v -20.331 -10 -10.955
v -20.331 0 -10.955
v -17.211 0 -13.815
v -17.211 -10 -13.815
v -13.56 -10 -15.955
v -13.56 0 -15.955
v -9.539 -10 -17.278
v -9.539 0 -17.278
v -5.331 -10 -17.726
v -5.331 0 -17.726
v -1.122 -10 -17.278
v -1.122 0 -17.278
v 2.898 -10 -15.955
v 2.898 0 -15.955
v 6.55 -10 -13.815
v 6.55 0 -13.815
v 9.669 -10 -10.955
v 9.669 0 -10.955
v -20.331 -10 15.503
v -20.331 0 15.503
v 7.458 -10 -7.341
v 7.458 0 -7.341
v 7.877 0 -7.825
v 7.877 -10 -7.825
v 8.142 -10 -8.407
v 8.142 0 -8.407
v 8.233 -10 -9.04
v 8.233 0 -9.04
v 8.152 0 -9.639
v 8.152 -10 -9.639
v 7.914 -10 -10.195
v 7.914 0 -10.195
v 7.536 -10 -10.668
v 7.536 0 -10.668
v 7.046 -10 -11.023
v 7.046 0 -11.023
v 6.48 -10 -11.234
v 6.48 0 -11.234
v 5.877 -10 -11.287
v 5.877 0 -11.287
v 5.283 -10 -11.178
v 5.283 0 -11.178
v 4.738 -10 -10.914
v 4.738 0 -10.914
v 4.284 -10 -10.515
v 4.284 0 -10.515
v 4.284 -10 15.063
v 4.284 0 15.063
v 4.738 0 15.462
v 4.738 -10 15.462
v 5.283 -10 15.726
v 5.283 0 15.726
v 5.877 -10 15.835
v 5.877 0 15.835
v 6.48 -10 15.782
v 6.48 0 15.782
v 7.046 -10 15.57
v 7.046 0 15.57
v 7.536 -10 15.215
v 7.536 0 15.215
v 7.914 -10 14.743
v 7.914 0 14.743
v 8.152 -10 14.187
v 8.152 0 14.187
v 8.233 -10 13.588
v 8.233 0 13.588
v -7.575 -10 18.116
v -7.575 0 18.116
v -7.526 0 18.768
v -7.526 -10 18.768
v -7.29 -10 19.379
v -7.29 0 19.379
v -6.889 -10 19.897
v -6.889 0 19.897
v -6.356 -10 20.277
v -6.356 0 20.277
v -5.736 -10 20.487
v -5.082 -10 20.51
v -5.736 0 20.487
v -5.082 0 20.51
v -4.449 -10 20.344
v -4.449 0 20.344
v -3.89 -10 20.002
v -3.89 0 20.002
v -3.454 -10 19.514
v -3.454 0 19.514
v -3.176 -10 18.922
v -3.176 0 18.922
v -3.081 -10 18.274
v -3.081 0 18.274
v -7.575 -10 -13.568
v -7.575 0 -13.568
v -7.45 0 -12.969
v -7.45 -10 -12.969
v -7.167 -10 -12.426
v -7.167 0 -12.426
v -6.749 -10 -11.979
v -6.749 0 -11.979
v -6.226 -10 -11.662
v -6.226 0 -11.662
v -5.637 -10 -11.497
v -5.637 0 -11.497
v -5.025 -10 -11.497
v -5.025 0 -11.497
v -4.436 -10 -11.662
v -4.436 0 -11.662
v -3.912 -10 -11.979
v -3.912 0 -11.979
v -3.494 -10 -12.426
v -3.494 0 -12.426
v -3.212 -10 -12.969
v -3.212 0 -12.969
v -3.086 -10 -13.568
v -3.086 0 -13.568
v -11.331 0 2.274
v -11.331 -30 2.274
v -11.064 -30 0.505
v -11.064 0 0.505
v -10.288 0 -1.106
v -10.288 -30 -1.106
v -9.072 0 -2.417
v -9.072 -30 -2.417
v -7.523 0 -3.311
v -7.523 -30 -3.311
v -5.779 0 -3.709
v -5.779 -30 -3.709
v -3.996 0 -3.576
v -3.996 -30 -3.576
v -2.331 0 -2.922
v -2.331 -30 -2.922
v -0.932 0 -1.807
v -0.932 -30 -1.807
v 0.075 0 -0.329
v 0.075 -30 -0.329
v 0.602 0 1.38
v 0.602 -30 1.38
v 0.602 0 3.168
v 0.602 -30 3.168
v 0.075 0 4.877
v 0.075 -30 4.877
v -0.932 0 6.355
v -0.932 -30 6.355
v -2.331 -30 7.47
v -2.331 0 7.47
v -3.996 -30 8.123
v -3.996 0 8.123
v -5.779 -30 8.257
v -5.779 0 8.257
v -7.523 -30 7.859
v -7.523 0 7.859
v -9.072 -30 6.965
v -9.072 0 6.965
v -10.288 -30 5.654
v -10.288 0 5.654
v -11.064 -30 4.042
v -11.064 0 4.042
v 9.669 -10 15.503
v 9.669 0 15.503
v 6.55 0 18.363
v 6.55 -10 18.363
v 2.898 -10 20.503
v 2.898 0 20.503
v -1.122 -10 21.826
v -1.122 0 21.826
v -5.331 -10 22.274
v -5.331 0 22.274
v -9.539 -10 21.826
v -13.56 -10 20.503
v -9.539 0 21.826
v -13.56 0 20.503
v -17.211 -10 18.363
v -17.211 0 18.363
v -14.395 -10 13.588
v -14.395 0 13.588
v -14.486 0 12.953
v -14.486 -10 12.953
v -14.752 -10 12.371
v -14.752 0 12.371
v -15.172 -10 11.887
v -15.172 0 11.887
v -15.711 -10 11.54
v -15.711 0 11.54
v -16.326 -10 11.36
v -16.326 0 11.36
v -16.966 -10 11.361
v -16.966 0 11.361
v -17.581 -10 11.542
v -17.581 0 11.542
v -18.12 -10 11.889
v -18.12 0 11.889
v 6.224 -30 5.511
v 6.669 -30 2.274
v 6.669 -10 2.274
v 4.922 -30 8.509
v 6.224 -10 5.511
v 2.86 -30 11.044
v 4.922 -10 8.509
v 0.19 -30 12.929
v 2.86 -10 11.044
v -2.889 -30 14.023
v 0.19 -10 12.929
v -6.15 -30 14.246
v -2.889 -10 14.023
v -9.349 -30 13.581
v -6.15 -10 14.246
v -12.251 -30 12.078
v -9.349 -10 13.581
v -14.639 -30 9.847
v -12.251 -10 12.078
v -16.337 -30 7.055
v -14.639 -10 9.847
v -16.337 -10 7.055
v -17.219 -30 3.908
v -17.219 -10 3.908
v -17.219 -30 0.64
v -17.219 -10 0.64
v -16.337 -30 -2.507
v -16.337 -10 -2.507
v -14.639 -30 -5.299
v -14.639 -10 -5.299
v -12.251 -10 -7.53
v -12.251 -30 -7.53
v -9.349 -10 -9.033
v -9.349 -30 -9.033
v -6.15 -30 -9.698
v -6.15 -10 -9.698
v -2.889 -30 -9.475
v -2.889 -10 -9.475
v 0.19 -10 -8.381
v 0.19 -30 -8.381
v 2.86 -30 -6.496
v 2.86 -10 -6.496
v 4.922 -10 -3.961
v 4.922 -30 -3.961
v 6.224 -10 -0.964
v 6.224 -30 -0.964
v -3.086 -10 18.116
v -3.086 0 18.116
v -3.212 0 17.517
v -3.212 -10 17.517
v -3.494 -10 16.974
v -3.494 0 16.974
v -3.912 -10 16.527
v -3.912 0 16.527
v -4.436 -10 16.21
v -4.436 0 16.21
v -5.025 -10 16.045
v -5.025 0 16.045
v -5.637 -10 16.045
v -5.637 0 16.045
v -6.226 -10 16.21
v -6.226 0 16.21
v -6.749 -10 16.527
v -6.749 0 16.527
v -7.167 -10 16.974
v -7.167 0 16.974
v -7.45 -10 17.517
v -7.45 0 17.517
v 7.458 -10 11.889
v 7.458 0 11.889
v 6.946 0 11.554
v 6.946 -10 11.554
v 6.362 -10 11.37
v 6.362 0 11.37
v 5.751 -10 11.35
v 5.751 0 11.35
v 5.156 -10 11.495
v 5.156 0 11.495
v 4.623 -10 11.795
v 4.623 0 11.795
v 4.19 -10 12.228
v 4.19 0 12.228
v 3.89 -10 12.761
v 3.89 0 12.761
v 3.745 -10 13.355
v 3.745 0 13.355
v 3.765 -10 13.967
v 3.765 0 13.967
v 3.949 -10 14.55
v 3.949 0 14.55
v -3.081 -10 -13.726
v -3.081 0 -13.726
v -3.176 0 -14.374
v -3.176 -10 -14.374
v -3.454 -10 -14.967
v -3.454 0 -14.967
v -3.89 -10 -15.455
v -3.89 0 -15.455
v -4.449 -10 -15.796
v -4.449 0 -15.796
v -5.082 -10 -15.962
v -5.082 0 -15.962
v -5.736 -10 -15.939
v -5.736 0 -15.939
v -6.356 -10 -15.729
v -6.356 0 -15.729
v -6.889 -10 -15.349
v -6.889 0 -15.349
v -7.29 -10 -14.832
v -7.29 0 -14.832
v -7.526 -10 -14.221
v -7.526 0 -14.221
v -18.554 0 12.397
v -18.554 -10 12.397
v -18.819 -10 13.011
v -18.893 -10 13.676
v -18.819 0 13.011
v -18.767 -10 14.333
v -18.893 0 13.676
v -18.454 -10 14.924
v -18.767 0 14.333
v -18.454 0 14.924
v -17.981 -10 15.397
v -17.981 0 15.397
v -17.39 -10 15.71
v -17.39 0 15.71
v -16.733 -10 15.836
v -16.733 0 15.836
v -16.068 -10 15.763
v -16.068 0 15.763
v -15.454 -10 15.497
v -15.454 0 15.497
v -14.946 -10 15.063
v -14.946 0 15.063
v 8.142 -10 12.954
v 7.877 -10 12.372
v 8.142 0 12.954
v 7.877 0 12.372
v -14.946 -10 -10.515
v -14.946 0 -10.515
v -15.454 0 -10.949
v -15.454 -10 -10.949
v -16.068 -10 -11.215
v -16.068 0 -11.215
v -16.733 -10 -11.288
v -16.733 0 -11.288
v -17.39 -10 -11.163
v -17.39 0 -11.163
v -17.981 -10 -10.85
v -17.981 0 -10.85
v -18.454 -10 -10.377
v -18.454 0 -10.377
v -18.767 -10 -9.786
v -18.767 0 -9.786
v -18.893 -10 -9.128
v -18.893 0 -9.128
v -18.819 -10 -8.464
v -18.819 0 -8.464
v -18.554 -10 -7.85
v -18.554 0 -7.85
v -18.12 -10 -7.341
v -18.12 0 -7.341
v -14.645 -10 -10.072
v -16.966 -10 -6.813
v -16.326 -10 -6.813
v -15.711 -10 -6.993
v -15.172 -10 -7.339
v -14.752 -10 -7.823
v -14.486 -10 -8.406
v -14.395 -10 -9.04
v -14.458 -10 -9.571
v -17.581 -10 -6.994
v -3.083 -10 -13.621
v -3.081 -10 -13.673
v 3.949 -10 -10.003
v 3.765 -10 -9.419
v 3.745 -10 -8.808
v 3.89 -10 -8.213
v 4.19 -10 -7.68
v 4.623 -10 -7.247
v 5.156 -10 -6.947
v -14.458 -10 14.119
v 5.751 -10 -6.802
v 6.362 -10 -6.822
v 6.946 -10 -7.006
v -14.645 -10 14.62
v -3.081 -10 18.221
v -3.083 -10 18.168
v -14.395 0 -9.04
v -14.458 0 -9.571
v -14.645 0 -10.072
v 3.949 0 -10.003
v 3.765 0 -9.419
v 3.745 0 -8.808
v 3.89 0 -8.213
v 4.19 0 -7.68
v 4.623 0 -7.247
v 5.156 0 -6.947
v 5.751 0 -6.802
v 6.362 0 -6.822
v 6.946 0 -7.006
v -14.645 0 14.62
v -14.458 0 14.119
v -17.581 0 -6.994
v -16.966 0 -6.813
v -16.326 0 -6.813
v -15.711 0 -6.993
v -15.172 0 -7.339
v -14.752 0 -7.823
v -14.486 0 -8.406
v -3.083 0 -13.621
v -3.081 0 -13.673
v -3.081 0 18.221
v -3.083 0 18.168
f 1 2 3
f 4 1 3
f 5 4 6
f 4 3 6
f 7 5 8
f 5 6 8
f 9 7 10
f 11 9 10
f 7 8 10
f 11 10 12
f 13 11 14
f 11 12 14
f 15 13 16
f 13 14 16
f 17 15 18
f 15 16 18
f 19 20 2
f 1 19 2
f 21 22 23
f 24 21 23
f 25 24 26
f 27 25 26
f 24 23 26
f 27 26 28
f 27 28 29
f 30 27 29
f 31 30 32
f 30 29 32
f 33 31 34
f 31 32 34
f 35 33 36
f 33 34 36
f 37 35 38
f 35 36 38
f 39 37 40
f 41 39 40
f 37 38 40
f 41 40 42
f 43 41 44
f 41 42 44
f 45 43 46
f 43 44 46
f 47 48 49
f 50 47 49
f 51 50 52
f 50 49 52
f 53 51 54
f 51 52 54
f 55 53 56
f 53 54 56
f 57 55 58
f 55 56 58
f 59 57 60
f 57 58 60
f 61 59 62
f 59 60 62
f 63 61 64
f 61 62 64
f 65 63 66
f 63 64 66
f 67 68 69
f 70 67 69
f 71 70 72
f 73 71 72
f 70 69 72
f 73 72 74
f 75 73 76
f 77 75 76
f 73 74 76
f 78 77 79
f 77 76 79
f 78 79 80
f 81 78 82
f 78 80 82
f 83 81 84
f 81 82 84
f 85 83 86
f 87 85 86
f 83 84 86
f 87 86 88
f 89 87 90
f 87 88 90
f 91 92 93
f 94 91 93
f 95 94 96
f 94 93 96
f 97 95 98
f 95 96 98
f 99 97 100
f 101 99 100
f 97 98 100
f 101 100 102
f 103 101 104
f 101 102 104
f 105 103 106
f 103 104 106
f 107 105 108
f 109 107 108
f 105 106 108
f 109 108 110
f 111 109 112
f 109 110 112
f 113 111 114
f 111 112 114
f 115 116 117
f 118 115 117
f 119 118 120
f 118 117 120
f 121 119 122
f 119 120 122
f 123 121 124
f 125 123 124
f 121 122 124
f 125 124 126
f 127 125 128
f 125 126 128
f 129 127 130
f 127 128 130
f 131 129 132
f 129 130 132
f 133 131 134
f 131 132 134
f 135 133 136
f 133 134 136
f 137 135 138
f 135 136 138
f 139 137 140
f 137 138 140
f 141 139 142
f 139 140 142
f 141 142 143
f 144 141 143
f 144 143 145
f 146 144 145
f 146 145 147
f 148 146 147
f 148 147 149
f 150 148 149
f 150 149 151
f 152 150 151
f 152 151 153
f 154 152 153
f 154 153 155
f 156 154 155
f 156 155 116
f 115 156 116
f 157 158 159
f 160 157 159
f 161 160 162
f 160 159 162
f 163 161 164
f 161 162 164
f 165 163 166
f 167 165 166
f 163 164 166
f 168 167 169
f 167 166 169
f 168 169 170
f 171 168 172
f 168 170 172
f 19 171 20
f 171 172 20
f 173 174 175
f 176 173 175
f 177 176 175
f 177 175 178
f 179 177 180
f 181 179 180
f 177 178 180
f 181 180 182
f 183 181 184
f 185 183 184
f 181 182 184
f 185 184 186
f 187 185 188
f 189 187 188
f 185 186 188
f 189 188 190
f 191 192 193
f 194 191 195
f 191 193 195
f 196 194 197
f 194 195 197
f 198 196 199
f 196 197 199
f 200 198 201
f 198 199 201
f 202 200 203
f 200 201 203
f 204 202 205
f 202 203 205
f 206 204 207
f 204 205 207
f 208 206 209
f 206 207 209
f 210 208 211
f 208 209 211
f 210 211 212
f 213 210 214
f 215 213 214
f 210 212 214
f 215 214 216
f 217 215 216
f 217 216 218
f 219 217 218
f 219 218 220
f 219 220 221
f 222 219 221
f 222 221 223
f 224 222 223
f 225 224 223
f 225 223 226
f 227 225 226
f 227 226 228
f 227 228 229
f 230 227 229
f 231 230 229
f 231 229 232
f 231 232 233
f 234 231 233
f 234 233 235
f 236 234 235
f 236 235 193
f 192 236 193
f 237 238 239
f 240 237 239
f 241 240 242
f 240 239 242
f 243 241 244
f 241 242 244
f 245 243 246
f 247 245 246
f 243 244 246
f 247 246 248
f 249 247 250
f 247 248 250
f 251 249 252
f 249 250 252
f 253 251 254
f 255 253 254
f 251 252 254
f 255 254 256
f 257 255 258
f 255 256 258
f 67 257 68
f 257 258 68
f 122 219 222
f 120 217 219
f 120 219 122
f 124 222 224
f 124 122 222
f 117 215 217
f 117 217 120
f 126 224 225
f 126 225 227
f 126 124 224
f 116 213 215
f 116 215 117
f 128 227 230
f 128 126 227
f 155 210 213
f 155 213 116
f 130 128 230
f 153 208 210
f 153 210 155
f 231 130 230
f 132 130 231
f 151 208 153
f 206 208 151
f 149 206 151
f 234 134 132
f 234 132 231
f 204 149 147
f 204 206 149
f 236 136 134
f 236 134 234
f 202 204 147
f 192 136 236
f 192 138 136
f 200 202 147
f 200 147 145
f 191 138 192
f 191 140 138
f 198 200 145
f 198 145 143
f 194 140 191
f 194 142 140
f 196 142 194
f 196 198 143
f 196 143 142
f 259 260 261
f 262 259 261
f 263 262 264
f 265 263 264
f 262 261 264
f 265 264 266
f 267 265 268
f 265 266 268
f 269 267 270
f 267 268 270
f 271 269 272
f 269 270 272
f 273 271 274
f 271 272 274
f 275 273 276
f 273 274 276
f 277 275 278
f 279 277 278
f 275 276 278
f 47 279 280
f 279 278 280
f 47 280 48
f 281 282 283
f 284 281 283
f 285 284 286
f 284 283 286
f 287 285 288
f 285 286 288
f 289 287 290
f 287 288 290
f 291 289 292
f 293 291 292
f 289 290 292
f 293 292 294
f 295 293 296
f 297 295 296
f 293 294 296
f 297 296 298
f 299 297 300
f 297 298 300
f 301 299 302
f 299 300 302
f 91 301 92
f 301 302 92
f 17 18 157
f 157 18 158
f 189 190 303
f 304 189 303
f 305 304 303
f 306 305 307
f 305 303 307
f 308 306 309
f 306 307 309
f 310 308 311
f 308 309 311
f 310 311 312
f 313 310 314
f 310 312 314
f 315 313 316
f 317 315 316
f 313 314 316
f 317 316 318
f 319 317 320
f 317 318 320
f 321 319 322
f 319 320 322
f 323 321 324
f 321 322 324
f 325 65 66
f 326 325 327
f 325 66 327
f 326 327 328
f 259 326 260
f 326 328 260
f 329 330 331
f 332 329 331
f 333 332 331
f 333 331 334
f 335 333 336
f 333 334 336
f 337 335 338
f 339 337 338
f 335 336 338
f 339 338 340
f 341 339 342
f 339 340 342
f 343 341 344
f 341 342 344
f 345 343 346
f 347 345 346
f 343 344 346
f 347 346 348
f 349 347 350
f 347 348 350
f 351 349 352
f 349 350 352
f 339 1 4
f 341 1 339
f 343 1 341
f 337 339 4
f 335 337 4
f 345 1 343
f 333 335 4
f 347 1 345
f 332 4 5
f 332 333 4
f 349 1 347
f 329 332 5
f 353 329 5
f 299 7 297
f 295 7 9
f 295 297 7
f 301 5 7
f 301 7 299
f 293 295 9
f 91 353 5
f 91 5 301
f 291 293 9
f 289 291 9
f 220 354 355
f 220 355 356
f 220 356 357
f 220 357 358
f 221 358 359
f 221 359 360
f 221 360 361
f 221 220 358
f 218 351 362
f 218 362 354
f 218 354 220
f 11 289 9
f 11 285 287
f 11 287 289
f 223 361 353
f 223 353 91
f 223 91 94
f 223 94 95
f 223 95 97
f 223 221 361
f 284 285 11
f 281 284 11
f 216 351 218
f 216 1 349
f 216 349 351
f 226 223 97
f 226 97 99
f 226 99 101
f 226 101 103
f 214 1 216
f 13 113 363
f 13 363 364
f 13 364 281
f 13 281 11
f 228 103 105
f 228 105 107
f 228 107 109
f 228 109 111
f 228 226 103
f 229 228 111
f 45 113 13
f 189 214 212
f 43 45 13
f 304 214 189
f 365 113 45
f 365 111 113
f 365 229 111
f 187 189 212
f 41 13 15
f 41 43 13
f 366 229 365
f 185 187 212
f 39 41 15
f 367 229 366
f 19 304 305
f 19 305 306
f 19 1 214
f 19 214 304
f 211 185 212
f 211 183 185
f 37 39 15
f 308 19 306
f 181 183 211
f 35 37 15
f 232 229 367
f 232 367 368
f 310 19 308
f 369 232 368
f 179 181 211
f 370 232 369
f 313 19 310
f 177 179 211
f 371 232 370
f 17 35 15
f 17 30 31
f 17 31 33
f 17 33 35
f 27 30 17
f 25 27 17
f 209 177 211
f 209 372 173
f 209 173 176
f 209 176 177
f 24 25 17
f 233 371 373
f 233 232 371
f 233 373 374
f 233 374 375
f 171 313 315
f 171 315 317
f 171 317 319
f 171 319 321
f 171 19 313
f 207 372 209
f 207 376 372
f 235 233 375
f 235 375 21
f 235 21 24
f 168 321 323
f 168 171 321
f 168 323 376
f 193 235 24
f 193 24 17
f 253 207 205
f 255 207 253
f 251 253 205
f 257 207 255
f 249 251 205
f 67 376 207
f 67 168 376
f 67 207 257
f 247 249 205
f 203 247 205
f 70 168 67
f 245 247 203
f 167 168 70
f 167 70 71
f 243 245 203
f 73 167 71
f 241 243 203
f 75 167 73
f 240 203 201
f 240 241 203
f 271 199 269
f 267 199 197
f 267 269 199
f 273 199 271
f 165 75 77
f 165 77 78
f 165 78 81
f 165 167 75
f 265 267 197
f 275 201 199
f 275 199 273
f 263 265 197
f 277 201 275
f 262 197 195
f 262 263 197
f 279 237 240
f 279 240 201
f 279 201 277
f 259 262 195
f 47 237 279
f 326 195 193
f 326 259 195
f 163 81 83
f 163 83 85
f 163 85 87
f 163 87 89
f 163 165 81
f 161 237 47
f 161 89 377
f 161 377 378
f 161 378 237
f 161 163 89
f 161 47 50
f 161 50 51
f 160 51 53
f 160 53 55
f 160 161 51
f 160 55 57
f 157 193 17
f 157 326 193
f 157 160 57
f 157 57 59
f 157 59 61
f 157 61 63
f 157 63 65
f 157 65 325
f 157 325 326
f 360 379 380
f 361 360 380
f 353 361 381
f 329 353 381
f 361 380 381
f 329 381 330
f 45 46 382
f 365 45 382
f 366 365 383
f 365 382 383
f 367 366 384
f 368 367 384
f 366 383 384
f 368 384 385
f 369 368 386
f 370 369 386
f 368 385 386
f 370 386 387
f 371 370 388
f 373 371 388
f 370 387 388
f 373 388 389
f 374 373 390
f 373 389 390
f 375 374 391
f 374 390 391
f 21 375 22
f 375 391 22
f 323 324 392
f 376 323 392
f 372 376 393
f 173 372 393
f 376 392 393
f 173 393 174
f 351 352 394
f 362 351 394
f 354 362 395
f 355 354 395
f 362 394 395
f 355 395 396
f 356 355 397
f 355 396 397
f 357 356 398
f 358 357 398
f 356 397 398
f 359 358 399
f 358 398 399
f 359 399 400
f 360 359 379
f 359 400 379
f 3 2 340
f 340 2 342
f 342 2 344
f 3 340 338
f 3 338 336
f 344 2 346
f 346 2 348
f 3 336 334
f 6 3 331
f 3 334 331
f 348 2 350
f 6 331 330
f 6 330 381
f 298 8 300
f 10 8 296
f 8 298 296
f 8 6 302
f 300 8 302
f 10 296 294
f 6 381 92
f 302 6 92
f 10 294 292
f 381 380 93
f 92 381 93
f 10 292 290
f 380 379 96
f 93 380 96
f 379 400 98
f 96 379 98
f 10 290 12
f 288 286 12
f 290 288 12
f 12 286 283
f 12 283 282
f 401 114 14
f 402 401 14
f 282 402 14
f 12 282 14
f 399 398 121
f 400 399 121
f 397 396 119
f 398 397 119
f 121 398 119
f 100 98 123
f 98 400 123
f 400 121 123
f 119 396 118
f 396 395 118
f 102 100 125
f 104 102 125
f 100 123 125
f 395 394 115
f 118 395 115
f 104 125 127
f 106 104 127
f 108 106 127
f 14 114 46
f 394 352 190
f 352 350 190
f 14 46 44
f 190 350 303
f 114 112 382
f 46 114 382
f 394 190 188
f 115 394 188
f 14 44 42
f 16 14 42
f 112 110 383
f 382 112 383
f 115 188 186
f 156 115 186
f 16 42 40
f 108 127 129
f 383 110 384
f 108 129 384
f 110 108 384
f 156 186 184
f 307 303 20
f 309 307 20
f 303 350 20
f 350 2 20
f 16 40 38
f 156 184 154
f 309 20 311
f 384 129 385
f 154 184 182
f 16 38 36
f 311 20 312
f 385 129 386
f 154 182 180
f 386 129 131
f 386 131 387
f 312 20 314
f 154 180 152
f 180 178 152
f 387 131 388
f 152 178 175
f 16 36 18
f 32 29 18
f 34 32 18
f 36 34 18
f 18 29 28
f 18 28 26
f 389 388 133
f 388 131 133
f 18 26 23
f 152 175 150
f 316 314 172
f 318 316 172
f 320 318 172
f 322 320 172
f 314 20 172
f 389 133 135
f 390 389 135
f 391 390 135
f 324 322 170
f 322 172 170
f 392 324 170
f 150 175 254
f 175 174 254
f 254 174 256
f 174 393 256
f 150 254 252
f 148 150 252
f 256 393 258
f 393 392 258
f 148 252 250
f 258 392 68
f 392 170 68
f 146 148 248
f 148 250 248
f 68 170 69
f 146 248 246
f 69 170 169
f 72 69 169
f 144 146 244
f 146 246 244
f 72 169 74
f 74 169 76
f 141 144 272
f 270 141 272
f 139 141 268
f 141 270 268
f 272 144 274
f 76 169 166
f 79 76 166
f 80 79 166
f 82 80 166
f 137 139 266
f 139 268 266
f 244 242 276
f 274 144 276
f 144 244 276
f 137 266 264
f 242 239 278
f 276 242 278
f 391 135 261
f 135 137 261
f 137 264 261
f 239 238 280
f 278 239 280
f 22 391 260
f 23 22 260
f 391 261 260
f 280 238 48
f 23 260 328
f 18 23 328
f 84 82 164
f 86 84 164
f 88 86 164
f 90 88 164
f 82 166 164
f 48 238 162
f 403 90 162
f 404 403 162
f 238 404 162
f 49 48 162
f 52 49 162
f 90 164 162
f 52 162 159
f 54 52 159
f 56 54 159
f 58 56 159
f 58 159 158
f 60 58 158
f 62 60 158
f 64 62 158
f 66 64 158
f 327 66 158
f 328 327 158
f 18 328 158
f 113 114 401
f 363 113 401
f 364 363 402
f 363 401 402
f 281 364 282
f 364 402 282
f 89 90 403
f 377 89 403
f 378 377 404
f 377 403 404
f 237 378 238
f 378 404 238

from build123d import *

# Parameters (mm, degrees)
F0_R     = 12
F1_DEPTH = 10
F2_DEPTH = 30
F3_D     = 12
F3_DEPTH = 50
F3_TIP   = 3.6051637142


with BuildPart() as f1:
    # F0 (on Front) → F1 (new body)
    with BuildSketch(Plane.XZ):
        with BuildLine():
            Line((9.6692045312, -3.2938710881), (9.6692045312, 7.8416576376))
            ThreePointArc((9.6692045312, 7.8416576376), (8.7102254474, 9.9452511488), (7.4580991057, 11.8886826932))
            ThreePointArc((7.4580991057, 11.8886826932), (4.3919227725, 11.9966115161), (4.2839939496, 15.0627878494))
            ThreePointArc((4.2839939496, 15.0627878494), (0.792139449, 17.055965795), (-3.0863641887, 18.1156901498))
            ThreePointArc((-3.0863641887, 18.1156901498), (-5.3307954688, 16.0238932748), (-7.575226749, 18.1156901498))
            ThreePointArc((-7.575226749, 18.1156901498), (-11.4537303867, 17.055965795), (-14.9455848872, 15.0627878494))
            ThreePointArc((-14.9455848872, 15.0627878494), (-14.5367720196, 14.3749809927), (-14.3945039678, 13.5876017738))
            ThreePointArc((-14.3945039678, 13.5876017738), (-15.7108735993, 11.5404490352), (-18.1196900434, 11.8886826932))
            ThreePointArc((-18.1196900434, 11.8886826932), (-19.371816385, 9.9452511488), (-20.3307954688, 7.8416576376))
            Line((-20.3307954688, 7.8416576376), (-20.3307954688, -3.2938710881))
            ThreePointArc((-20.3307954688, -3.2938710881), (-19.371816385, -5.3974645992), (-18.1196900434, -7.3408961436))
            ThreePointArc((-18.1196900434, -7.3408961436), (-15.7108735993, -6.9926624856), (-14.3945039678, -9.0398152242))
            ThreePointArc((-14.3945039678, -9.0398152242), (-14.5367720196, -9.8271944431), (-14.9455848872, -10.5150012998))
            ThreePointArc((-14.9455848872, -10.5150012998), (-11.4537303867, -12.5081792454), (-7.575226749, -13.5679036002))
            ThreePointArc((-7.575226749, -13.5679036002), (-5.3307954688, -11.4761067252), (-3.0863641887, -13.5679036002))
            ThreePointArc((-3.0863641887, -13.5679036002), (0.792139449, -12.5081792454), (4.2839939496, -10.5150012998))
            ThreePointArc((4.2839939496, -10.5150012998), (4.3919227725, -7.4488249665), (7.4580991057, -7.3408961436))
            ThreePointArc((7.4580991057, -7.3408961436), (8.7102254474, -5.3974645992), (9.6692045312, -3.2938710881))
        make_face()
        with Locations((-5.3307954688, 2.2738932748)):
            Circle(F0_R, mode=Mode.SUBTRACT)
        with BuildLine():
            Line((9.6692045312, 7.8416576376), (9.6692045312, 15.5026498301))
            ThreePointArc((9.6692045312, 15.5026498301), (-5.3307954688, 22.2738932748), (-20.3307954688, 15.5026498301))
            Line((-20.3307954688, 15.5026498301), (-20.3307954688, 7.8416576376))
            ThreePointArc((-20.3307954688, 7.8416576376), (-19.371816385, 9.9452511488), (-18.1196900434, 11.8886826932))
            ThreePointArc((-18.1196900434, 11.8886826932), (-18.2354942255, 15.1785920314), (-14.9455848872, 15.0627878494))
            ThreePointArc((-14.9455848872, 15.0627878494), (-11.4537303867, 17.055965795), (-7.575226749, 18.1156901498))
            ThreePointArc((-7.575226749, 18.1156901498), (-5.4099460206, 20.5225006638), (-3.0807954688, 18.2738932748))
            ThreePointArc((-3.0807954688, 18.2738932748), (-3.0821880798, 18.194742723), (-3.0863641887, 18.1156901498))
            ThreePointArc((-3.0863641887, 18.1156901498), (0.792139449, 17.055965795), (4.2839939496, 15.0627878494))
            ThreePointArc((4.2839939496, 15.0627878494), (6.770292249, 15.695333722), (8.2329130301, 13.5876017738))
            ThreePointArc((8.2329130301, 13.5876017738), (8.0300657687, 12.6539714053), (7.4580991057, 11.8886826932))
            ThreePointArc((7.4580991057, 11.8886826932), (8.7102254474, 9.9452511488), (9.6692045312, 7.8416576376))
        make_face()
        with BuildLine():
            ThreePointArc((-20.3307954688, -10.9548632805), (-5.3307954688, -17.7261067252), (9.6692045312, -10.9548632805))
            Line((9.6692045312, -10.9548632805), (9.6692045312, -3.2938710881))
            ThreePointArc((9.6692045312, -3.2938710881), (8.7102254474, -5.3974645992), (7.4580991057, -7.3408961436))
            ThreePointArc((7.4580991057, -7.3408961436), (8.0300657687, -8.1061848557), (8.2329130301, -9.0398152242))
            ThreePointArc((8.2329130301, -9.0398152242), (6.770292249, -11.1475471725), (4.2839939496, -10.5150012998))
            ThreePointArc((4.2839939496, -10.5150012998), (0.792139449, -12.5081792454), (-3.0863641887, -13.5679036002))
            ThreePointArc((-3.0863641887, -13.5679036002), (-3.0821880798, -13.6469561734), (-3.0807954688, -13.7261067252))
            ThreePointArc((-3.0807954688, -13.7261067252), (-5.4099460206, -15.9747141143), (-7.575226749, -13.5679036002))
            ThreePointArc((-7.575226749, -13.5679036002), (-11.4537303867, -12.5081792454), (-14.9455848872, -10.5150012998))
            ThreePointArc((-14.9455848872, -10.5150012998), (-18.2354942255, -10.6308054819), (-18.1196900434, -7.3408961436))
            ThreePointArc((-18.1196900434, -7.3408961436), (-19.371816385, -5.3974645992), (-20.3307954688, -3.2938710881))
            Line((-20.3307954688, -3.2938710881), (-20.3307954688, -10.9548632805))
        make_face()
        with Locations((-5.3307954688, 2.2738932748)):
            Circle(F0_R)
    extrude(amount=F1_DEPTH)

    # F0 (on Front) → F2 (join)
    with BuildSketch(Plane.XZ):
        with Locations((-5.3307954688, 2.2738932748)):
            Circle(F0_R)
    extrude(amount=F2_DEPTH)

    # F3
    with Locations(Plane(origin=(0, 0, 0), x_dir=(1, 0, 0), z_dir=(0, 1, 0))):
        with Locations((-5.3307954688, -2.2738932748)):
            Hole(F3_D / 2, depth=F3_DEPTH)
            with Locations((0, 0, -(F3_DEPTH + F3_TIP / 2))):  # 118° drill point
                Cone(0, F3_D / 2, F3_TIP, mode=Mode.SUBTRACT)


solid = f1.part
